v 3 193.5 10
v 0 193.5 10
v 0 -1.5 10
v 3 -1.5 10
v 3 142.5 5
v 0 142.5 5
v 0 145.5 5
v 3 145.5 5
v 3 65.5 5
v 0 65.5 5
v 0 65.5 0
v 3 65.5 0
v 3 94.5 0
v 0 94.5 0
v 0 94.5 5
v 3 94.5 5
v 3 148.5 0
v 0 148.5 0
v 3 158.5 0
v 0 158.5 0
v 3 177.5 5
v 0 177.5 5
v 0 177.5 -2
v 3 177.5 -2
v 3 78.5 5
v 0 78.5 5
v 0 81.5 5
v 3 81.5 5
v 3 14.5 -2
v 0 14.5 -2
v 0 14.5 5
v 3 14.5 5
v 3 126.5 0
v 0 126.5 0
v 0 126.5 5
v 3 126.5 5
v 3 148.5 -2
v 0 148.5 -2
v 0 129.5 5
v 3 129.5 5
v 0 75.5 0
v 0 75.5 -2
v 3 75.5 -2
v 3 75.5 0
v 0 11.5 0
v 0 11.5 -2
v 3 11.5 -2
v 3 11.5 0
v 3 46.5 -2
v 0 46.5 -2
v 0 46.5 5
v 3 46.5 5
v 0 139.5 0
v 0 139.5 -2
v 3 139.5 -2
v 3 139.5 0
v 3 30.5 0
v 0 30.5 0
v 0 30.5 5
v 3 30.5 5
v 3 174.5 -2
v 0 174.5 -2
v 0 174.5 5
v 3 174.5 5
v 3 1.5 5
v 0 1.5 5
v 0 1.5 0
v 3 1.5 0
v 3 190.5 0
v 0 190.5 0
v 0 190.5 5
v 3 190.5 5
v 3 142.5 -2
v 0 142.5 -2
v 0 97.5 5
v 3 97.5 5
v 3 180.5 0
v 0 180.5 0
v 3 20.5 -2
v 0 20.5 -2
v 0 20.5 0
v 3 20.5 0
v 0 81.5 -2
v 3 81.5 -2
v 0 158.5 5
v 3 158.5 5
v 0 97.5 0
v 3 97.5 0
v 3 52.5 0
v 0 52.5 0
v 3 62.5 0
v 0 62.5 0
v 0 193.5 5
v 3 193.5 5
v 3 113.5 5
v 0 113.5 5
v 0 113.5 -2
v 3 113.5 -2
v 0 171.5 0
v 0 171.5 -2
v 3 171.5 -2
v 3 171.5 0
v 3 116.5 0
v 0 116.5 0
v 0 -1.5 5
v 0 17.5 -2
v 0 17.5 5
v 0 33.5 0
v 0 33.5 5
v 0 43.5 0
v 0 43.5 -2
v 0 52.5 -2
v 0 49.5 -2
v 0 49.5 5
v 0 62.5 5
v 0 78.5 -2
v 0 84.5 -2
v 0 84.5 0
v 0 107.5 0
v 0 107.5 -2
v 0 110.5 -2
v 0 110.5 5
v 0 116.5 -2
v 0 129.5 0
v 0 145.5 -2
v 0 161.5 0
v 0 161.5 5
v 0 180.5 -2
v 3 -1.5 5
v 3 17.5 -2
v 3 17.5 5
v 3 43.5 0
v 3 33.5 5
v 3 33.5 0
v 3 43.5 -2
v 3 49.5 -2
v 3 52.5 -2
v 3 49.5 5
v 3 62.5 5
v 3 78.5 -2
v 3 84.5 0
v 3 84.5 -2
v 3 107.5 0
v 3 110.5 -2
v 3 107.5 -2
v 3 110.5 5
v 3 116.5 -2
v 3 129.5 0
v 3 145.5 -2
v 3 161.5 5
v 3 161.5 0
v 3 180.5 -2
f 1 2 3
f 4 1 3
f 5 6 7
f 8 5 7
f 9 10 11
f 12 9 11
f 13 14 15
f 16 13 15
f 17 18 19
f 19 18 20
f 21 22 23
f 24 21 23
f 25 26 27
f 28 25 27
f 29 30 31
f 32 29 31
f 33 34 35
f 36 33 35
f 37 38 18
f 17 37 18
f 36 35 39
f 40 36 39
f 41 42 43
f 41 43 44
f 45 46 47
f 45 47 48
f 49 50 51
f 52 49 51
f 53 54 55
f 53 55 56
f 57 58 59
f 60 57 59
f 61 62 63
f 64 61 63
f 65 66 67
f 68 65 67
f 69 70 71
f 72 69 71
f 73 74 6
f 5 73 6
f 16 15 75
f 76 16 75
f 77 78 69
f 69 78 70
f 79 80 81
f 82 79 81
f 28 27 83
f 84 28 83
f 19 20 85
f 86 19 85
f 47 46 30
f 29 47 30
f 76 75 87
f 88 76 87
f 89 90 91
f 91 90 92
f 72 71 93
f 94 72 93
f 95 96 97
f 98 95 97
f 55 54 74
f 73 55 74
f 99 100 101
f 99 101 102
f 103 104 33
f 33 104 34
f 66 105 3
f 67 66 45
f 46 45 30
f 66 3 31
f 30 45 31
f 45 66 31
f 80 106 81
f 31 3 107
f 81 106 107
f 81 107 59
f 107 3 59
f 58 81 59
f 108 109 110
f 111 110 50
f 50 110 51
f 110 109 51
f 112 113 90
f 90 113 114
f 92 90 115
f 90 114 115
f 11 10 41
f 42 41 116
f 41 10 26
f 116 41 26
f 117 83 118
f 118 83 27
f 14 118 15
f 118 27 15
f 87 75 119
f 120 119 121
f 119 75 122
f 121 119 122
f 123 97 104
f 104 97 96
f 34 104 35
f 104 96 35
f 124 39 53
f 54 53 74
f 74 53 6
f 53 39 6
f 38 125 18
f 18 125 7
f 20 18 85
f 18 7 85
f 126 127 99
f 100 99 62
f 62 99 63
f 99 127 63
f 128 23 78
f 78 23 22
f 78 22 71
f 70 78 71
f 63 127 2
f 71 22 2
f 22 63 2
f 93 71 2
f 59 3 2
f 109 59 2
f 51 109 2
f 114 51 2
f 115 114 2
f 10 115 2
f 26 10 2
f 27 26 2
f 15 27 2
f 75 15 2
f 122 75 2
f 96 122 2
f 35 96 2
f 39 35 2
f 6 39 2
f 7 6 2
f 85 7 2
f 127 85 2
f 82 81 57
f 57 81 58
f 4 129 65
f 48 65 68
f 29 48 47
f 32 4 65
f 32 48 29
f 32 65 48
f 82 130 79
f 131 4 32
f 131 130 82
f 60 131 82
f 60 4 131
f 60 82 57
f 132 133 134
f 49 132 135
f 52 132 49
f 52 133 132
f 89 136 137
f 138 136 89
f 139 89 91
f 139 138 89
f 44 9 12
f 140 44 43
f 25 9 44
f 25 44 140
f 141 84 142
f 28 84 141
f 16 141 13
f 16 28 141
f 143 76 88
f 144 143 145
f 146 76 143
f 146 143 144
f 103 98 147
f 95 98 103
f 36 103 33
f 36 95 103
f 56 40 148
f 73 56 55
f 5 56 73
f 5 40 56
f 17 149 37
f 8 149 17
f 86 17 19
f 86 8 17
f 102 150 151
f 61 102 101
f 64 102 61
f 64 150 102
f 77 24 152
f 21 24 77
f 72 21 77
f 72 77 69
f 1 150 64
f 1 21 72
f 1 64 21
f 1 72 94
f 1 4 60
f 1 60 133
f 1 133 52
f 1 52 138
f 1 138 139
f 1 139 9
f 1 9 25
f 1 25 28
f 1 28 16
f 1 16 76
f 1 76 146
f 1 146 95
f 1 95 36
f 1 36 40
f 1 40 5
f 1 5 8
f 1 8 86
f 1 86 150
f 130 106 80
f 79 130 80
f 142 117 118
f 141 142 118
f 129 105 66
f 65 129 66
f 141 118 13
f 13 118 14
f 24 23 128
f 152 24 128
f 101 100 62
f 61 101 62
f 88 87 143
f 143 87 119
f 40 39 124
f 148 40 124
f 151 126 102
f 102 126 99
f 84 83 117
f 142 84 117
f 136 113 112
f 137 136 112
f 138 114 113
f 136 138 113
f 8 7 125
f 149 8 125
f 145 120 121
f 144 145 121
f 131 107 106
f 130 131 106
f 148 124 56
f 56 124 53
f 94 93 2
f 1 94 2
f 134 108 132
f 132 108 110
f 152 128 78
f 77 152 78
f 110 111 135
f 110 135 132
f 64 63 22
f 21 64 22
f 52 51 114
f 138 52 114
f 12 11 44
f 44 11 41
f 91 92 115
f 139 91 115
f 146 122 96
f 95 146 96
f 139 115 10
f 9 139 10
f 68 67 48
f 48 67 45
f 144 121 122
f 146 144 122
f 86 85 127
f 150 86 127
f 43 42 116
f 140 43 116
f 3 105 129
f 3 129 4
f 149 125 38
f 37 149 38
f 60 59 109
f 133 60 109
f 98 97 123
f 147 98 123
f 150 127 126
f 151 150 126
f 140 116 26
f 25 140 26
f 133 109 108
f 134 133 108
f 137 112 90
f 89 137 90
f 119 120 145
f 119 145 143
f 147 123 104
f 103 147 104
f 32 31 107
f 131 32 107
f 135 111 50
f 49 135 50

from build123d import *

# Parameters (mm, degrees)
F0_W     = 3
F0_H     = 2
F0_W_2   = 1.5
F0_H_2   = 5
F1_DEPTH = 3


with BuildPart() as f1:
    # F0 (on Right) → F1 (new body)
    with BuildSketch(Plane.YZ):
        Polygon((1.5, 5), (1.5, 0), (11.5, 0), (14.5, 0), (14.5, 5), (14.5, 10), (11.5, 10), (1.5, 10), align=None)
        Polygon((17.5, 5), (17.5, 0), (20.5, 0), (30.5, 0), (30.5, 5), (30.5, 10), (20.5, 10), (17.5, 10), align=None)
        with Locations((45, -1)):
            Rectangle(F0_W, F0_H)
        with Locations((0.75, 7.5)):
            Rectangle(F0_W_2, F0_H_2)
        with Locations((-0.75, 7.5)):
            Rectangle(F0_W_2, F0_H_2)
        with Locations((16, 7.5)):
            Rectangle(F0_W, F0_H_2)
        with Locations((32, 7.5)):
            Rectangle(F0_W, F0_H_2)
        with Locations((48, 7.5)):
            Rectangle(F0_W, F0_H_2)
        with Locations((51, -1)):
            Rectangle(F0_W, F0_H)
        with Locations((64, 7.5)):
            Rectangle(F0_W, F0_H_2)
        with Locations((77, -1)):
            Rectangle(F0_W, F0_H)
        with Locations((80, 7.5)):
            Rectangle(F0_W, F0_H_2)
        with Locations((83, -1)):
            Rectangle(F0_W, F0_H)
        with Locations((95.25, 7.5)):
            Rectangle(F0_W_2, F0_H_2)
        with Locations((96.75, 7.5)):
            Rectangle(F0_W_2, F0_H_2)
        with Locations((109, -1)):
            Rectangle(F0_W, F0_H)
        with Locations((112, 7.5)):
            Rectangle(F0_W, F0_H_2)
        with Locations((115, -1)):
            Rectangle(F0_W, F0_H)
        with Locations((128, 7.5)):
            Rectangle(F0_W, F0_H_2)
        with Locations((141, -1)):
            Rectangle(F0_W, F0_H)
        with Locations((144, 7.5)):
            Rectangle(F0_W, F0_H_2)
        with Locations((147, -1)):
            Rectangle(F0_W, F0_H)
        with Locations((160, 7.5)):
            Rectangle(F0_W, F0_H_2)
        with Locations((173, -1)):
            Rectangle(F0_W, F0_H)
        with Locations((176, 7.5)):
            Rectangle(F0_W, F0_H_2)
        with Locations((179, -1)):
            Rectangle(F0_W, F0_H)
        with Locations((191.25, 7.5)):
            Rectangle(F0_W_2, F0_H_2)
        with Locations((192.75, 7.5)):
            Rectangle(F0_W_2, F0_H_2)
        with Locations((13, -1)):
            Rectangle(F0_W, F0_H)
        with Locations((19, -1)):
            Rectangle(F0_W, F0_H)
        Polygon((33.5, 5), (33.5, 0), (43.5, 0), (46.5, 0), (46.5, 5), (46.5, 10), (33.5, 10), align=None)
        Polygon((49.5, 5), (49.5, 0), (52.5, 0), (62.5, 0), (62.5, 5), (62.5, 10), (49.5, 10), align=None)
        Polygon((78.5, 10), (65.5, 10), (65.5, 5), (65.5, 0), (75.5, 0), (78.5, 0), (78.5, 5), align=None)
        Polygon((94.5, 10), (81.5, 10), (81.5, 5), (81.5, 0), (84.5, 0), (94.5, 0), (94.5, 5), align=None)
        Polygon((110.5, 10), (97.5, 10), (97.5, 5), (97.5, 0), (107.5, 0), (110.5, 0), (110.5, 5), align=None)
        Polygon((126.5, 10), (113.5, 10), (113.5, 5), (113.5, 0), (116.5, 0), (126.5, 0), (126.5, 5), align=None)
        Polygon((142.5, 10), (129.5, 10), (129.5, 5), (129.5, 0), (139.5, 0), (142.5, 0), (142.5, 5), align=None)
        Polygon((158.5, 10), (145.5, 10), (145.5, 5), (145.5, 0), (148.5, 0), (158.5, 0), (158.5, 5), align=None)
        Polygon((171.5, 10), (161.5, 10), (161.5, 5), (161.5, 0), (171.5, 0), (174.5, 0), (174.5, 5), (174.5, 10), align=None)
        Polygon((180.5, 10), (177.5, 10), (177.5, 5), (177.5, 0), (180.5, 0), (190.5, 0), (190.5, 5), (190.5, 10), align=None)
    extrude(amount=F1_DEPTH)


solid = f1.part
